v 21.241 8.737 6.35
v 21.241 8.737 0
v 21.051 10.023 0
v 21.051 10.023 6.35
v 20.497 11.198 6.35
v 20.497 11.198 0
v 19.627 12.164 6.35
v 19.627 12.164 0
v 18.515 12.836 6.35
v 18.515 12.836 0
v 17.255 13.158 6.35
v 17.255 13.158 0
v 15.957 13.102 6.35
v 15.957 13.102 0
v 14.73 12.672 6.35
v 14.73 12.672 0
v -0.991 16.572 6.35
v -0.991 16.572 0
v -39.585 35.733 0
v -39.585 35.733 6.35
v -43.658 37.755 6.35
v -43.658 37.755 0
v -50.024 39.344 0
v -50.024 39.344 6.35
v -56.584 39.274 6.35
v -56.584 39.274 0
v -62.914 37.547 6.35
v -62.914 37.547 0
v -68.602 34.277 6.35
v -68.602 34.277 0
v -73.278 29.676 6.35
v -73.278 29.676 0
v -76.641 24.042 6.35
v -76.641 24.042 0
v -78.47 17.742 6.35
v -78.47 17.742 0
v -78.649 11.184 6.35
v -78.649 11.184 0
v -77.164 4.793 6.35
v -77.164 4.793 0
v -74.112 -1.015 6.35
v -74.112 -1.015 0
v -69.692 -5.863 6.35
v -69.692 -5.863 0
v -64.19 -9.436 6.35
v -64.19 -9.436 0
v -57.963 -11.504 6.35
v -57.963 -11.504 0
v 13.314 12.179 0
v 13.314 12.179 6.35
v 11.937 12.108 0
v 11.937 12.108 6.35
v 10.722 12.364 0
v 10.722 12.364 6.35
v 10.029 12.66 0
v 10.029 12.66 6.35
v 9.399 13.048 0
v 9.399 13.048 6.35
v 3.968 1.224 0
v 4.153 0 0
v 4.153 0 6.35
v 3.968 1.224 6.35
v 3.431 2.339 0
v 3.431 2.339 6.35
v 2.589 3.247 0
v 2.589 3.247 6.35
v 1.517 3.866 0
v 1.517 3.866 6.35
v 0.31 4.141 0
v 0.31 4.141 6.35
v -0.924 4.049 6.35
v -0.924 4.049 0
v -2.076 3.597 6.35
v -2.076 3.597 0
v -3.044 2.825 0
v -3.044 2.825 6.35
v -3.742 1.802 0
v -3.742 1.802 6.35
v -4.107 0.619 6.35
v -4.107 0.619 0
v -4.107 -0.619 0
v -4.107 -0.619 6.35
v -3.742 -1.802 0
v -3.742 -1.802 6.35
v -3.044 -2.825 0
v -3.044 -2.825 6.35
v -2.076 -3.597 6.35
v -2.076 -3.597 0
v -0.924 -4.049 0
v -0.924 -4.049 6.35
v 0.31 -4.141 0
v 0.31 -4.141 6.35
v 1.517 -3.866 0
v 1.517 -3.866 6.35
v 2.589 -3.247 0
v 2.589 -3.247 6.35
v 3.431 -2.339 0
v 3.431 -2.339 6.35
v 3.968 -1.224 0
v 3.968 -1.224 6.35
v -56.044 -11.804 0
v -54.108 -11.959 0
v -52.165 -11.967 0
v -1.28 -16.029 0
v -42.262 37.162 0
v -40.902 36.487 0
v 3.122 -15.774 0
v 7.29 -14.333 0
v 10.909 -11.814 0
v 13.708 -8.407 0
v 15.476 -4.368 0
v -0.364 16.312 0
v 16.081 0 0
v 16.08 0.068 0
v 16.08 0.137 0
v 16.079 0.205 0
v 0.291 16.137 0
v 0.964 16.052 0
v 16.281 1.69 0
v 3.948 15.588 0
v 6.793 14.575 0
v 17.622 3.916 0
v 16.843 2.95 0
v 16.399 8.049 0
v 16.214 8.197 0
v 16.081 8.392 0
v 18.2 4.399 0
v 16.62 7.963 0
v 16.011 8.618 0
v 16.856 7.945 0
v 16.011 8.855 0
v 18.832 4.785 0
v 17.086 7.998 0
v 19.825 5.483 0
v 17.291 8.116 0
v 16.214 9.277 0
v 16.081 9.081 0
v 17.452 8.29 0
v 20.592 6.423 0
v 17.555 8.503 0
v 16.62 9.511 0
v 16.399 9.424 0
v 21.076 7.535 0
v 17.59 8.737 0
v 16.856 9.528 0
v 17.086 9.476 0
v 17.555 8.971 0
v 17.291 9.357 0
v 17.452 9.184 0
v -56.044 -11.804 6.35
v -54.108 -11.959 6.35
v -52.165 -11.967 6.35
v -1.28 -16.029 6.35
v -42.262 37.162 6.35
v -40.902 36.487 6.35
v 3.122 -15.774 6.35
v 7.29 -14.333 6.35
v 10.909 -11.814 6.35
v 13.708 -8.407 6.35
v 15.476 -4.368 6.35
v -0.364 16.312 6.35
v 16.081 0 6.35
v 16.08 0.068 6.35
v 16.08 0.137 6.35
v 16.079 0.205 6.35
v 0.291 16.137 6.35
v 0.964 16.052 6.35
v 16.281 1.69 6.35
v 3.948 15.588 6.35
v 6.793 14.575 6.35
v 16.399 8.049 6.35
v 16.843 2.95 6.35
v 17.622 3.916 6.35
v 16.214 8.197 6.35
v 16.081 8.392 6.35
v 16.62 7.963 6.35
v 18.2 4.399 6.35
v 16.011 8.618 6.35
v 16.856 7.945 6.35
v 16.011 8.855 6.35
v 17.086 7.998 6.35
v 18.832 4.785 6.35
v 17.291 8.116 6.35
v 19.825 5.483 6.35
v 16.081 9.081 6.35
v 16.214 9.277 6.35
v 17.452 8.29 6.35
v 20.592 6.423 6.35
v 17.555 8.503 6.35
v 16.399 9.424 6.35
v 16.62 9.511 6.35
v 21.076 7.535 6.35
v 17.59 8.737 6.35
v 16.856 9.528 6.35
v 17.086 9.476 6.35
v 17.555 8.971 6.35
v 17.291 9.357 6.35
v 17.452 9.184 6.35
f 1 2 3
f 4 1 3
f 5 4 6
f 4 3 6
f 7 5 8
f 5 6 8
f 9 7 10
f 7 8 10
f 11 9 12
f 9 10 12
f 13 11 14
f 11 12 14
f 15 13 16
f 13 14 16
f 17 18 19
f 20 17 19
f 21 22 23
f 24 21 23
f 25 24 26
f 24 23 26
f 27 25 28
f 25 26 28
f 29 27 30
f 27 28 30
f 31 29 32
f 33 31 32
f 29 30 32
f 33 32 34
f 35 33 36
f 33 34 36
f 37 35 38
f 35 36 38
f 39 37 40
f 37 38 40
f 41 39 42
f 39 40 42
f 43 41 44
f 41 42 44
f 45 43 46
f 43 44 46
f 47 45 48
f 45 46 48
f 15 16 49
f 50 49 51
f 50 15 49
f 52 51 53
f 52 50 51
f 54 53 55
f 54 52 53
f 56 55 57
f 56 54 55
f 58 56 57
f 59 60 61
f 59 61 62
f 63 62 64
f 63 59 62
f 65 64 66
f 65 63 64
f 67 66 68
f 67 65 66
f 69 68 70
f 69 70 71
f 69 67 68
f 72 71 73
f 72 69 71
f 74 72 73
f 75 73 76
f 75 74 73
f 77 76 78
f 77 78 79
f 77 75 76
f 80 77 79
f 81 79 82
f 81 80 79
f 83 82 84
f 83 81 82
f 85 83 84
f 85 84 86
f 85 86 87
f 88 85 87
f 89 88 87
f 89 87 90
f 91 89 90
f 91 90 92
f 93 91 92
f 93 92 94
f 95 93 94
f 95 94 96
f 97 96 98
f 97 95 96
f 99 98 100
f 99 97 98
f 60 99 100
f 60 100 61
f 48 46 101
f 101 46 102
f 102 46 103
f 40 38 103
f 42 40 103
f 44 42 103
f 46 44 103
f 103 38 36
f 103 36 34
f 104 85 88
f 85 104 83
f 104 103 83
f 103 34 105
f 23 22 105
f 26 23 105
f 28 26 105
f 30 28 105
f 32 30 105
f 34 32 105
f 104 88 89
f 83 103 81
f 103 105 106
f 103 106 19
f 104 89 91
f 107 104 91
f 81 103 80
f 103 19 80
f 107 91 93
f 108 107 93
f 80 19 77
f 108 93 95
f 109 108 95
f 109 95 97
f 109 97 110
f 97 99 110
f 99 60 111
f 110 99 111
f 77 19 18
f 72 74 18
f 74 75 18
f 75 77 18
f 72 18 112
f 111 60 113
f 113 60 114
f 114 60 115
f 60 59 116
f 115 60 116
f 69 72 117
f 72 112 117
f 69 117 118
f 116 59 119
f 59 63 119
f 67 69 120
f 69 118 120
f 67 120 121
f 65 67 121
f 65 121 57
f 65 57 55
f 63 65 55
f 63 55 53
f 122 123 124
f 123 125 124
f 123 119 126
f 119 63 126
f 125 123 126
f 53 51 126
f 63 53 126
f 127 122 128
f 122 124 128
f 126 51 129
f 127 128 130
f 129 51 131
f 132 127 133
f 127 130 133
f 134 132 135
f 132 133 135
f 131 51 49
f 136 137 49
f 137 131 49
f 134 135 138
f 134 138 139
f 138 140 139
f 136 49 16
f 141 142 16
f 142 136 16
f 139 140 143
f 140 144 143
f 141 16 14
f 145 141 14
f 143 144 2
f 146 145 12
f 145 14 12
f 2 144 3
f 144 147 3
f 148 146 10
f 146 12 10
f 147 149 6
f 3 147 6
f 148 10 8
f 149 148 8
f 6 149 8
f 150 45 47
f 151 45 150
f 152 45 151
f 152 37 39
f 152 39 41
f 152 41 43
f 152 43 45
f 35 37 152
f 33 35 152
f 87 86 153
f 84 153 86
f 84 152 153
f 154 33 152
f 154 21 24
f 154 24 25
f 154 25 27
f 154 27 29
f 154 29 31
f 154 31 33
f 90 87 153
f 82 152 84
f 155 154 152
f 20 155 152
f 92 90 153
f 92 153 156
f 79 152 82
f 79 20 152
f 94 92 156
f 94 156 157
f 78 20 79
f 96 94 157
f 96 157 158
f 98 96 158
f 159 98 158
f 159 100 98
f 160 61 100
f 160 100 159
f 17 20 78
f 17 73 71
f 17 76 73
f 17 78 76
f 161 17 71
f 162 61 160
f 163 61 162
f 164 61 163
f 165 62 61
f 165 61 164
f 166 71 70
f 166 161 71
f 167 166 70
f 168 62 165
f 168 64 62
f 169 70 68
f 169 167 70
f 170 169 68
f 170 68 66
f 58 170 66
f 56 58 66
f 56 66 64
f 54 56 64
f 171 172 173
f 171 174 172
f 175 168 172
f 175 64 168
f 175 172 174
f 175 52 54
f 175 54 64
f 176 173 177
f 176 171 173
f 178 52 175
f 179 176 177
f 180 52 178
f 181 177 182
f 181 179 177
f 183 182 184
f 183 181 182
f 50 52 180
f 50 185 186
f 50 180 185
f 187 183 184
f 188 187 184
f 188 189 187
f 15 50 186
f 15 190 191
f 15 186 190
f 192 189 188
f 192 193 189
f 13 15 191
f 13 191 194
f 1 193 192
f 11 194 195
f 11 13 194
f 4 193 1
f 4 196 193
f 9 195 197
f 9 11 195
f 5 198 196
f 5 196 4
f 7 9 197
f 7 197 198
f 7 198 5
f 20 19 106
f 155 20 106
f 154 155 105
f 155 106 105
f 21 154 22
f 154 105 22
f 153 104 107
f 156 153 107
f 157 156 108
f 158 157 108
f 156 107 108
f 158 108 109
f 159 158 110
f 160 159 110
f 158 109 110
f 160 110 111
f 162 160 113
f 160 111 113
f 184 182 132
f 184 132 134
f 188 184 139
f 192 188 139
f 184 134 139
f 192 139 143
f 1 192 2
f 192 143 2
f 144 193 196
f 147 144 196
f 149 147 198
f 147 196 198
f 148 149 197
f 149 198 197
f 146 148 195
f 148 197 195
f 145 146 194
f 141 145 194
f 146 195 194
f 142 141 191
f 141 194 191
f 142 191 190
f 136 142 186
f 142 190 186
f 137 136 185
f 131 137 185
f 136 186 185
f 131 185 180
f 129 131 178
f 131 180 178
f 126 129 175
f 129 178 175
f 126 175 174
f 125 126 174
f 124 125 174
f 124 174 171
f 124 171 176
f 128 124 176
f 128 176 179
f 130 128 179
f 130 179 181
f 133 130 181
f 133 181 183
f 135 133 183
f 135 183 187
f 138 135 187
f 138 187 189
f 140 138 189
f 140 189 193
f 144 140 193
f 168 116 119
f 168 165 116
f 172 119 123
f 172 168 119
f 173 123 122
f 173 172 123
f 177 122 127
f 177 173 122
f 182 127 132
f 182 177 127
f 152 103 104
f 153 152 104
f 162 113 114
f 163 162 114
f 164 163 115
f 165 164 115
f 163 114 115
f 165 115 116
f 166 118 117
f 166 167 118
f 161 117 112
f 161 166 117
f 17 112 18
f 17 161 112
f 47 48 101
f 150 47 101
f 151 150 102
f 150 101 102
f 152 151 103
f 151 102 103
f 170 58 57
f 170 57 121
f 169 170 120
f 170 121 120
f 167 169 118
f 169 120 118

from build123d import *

# Parameters (mm, degrees)
F0_R     = 4.1529
F1_DEPTH = 6.35
F2_R     = 5.08
F3_R     = 0.79375
F4_DEPTH = 6.604


with BuildPart() as f1:
    # F0 (on Top) → F1 (new body)
    with BuildSketch(Plane.XY):
        with BuildLine():
            Line((-39.5852921817, 35.7330972108), (-43.6584469102, 37.7552635994))
            ThreePointArc((-43.6584469102, 37.7552635994), (-77.757072432, 20.950769545), (-57.9630675112, -11.5038857774))
            Line((-57.9630675112, -11.5038857774), (-52.1653779445, -11.9667752425))
            ThreePointArc((-52.1653779445, -11.9667752425), (-34.5169287333, -4.1314539733), (-27.2771428081, 13.7695381418))
            ThreePointArc((-27.2771428081, 13.7695381418), (-30.5639418609, 26.3581090295), (-39.5852921817, 35.7330972108))
        make_face()
        with BuildLine():
            ThreePointArc((-39.5852921817, 35.7330972108), (-41.5771437171, 36.8342695403), (-43.6584469102, 37.7552635994))
            Line((-43.6584469102, 37.7552635994), (-39.5852921817, 35.7330972108))
        make_face()
        with BuildLine():
            Line((-52.1653779445, -11.9667752425), (-57.9630675112, -11.5038857774))
            ThreePointArc((-57.9630675112, -11.5038857774), (-55.0773333512, -11.8995410396), (-52.1653779445, -11.9667752425))
        make_face()
        with BuildLine():
            Line((0, 16.0805053817), (-39.5852921817, 35.7330972108))
            ThreePointArc((-39.5852921817, 35.7330972108), (-30.5639418609, 26.3581090295), (-27.2771428081, 13.7695381418))
            ThreePointArc((-27.2771428081, 13.7695381418), (-34.5169287333, -4.1314539733), (-52.1653779445, -11.9667752425))
            Line((-52.1653779445, -11.9667752425), (-1.2798007555, -16.0294966658))
            ThreePointArc((-1.2798007555, -16.0294966658), (-16.0677481424, 0.6404084366), (0, 16.0805053817))
        make_face()
        with BuildLine():
            ThreePointArc((12.550681619, 10.0530116996), (6.9615064675, 14.4955193434), (0, 16.0805053817))
            ThreePointArc((0, 16.0805053817), (-16.0677481424, 0.6404084366), (-1.2798007555, -16.0294966658))
            ThreePointArc((-1.2798007555, -16.0294966658), (10.9087765216, -11.8144508181), (16.0805053817, 0))
            ThreePointArc((16.0805053817, 0), (15.91872127, 2.2752948071), (15.4366243175, 4.5048066565))
            ThreePointArc((15.4366243175, 4.5048066565), (12.8528968999, 6.6855358941), (12.550681619, 10.0530116996))
        make_face()
        Circle(F0_R, mode=Mode.SUBTRACT)
        with BuildLine():
            ThreePointArc((21.2413206768, 8.7367389351), (17.4619629936, 13.1316161013), (12.550681619, 10.0530116996))
            ThreePointArc((12.550681619, 10.0530116996), (14.2659723887, 7.4205582766), (15.4366243175, 4.5048066565))
            ThreePointArc((15.4366243175, 4.5048066565), (19.4149247594, 5.1449514054), (21.2413206768, 8.7367389351))
        make_face()
        with BuildLine():
            ThreePointArc((15.4366243175, 4.5048066565), (14.2659723887, 7.4205582766), (12.550681619, 10.0530116996))
            ThreePointArc((12.550681619, 10.0530116996), (12.8528968999, 6.6855358941), (15.4366243175, 4.5048066565))
        make_face()
    extrude(amount=F1_DEPTH)

    # F2
    f2_edges = [f1.edges().sort_by_distance(p)[0] for p in [
        (12.550682, 10.053012, 3.175),
        (15.436624, 4.504807, 3.175),
        (0, 16.080505, 3.175),
    ]]
    fillet(f2_edges, radius=F2_R)

    # F3 (on face) → F4 (cut)
    with BuildSketch(Plane.XY.offset(6.35)):
        with Locations((16.7963206768, 8.7367389351)):
            Circle(F3_R)
    extrude(amount=-F4_DEPTH, mode=Mode.SUBTRACT)


solid = f1.part
